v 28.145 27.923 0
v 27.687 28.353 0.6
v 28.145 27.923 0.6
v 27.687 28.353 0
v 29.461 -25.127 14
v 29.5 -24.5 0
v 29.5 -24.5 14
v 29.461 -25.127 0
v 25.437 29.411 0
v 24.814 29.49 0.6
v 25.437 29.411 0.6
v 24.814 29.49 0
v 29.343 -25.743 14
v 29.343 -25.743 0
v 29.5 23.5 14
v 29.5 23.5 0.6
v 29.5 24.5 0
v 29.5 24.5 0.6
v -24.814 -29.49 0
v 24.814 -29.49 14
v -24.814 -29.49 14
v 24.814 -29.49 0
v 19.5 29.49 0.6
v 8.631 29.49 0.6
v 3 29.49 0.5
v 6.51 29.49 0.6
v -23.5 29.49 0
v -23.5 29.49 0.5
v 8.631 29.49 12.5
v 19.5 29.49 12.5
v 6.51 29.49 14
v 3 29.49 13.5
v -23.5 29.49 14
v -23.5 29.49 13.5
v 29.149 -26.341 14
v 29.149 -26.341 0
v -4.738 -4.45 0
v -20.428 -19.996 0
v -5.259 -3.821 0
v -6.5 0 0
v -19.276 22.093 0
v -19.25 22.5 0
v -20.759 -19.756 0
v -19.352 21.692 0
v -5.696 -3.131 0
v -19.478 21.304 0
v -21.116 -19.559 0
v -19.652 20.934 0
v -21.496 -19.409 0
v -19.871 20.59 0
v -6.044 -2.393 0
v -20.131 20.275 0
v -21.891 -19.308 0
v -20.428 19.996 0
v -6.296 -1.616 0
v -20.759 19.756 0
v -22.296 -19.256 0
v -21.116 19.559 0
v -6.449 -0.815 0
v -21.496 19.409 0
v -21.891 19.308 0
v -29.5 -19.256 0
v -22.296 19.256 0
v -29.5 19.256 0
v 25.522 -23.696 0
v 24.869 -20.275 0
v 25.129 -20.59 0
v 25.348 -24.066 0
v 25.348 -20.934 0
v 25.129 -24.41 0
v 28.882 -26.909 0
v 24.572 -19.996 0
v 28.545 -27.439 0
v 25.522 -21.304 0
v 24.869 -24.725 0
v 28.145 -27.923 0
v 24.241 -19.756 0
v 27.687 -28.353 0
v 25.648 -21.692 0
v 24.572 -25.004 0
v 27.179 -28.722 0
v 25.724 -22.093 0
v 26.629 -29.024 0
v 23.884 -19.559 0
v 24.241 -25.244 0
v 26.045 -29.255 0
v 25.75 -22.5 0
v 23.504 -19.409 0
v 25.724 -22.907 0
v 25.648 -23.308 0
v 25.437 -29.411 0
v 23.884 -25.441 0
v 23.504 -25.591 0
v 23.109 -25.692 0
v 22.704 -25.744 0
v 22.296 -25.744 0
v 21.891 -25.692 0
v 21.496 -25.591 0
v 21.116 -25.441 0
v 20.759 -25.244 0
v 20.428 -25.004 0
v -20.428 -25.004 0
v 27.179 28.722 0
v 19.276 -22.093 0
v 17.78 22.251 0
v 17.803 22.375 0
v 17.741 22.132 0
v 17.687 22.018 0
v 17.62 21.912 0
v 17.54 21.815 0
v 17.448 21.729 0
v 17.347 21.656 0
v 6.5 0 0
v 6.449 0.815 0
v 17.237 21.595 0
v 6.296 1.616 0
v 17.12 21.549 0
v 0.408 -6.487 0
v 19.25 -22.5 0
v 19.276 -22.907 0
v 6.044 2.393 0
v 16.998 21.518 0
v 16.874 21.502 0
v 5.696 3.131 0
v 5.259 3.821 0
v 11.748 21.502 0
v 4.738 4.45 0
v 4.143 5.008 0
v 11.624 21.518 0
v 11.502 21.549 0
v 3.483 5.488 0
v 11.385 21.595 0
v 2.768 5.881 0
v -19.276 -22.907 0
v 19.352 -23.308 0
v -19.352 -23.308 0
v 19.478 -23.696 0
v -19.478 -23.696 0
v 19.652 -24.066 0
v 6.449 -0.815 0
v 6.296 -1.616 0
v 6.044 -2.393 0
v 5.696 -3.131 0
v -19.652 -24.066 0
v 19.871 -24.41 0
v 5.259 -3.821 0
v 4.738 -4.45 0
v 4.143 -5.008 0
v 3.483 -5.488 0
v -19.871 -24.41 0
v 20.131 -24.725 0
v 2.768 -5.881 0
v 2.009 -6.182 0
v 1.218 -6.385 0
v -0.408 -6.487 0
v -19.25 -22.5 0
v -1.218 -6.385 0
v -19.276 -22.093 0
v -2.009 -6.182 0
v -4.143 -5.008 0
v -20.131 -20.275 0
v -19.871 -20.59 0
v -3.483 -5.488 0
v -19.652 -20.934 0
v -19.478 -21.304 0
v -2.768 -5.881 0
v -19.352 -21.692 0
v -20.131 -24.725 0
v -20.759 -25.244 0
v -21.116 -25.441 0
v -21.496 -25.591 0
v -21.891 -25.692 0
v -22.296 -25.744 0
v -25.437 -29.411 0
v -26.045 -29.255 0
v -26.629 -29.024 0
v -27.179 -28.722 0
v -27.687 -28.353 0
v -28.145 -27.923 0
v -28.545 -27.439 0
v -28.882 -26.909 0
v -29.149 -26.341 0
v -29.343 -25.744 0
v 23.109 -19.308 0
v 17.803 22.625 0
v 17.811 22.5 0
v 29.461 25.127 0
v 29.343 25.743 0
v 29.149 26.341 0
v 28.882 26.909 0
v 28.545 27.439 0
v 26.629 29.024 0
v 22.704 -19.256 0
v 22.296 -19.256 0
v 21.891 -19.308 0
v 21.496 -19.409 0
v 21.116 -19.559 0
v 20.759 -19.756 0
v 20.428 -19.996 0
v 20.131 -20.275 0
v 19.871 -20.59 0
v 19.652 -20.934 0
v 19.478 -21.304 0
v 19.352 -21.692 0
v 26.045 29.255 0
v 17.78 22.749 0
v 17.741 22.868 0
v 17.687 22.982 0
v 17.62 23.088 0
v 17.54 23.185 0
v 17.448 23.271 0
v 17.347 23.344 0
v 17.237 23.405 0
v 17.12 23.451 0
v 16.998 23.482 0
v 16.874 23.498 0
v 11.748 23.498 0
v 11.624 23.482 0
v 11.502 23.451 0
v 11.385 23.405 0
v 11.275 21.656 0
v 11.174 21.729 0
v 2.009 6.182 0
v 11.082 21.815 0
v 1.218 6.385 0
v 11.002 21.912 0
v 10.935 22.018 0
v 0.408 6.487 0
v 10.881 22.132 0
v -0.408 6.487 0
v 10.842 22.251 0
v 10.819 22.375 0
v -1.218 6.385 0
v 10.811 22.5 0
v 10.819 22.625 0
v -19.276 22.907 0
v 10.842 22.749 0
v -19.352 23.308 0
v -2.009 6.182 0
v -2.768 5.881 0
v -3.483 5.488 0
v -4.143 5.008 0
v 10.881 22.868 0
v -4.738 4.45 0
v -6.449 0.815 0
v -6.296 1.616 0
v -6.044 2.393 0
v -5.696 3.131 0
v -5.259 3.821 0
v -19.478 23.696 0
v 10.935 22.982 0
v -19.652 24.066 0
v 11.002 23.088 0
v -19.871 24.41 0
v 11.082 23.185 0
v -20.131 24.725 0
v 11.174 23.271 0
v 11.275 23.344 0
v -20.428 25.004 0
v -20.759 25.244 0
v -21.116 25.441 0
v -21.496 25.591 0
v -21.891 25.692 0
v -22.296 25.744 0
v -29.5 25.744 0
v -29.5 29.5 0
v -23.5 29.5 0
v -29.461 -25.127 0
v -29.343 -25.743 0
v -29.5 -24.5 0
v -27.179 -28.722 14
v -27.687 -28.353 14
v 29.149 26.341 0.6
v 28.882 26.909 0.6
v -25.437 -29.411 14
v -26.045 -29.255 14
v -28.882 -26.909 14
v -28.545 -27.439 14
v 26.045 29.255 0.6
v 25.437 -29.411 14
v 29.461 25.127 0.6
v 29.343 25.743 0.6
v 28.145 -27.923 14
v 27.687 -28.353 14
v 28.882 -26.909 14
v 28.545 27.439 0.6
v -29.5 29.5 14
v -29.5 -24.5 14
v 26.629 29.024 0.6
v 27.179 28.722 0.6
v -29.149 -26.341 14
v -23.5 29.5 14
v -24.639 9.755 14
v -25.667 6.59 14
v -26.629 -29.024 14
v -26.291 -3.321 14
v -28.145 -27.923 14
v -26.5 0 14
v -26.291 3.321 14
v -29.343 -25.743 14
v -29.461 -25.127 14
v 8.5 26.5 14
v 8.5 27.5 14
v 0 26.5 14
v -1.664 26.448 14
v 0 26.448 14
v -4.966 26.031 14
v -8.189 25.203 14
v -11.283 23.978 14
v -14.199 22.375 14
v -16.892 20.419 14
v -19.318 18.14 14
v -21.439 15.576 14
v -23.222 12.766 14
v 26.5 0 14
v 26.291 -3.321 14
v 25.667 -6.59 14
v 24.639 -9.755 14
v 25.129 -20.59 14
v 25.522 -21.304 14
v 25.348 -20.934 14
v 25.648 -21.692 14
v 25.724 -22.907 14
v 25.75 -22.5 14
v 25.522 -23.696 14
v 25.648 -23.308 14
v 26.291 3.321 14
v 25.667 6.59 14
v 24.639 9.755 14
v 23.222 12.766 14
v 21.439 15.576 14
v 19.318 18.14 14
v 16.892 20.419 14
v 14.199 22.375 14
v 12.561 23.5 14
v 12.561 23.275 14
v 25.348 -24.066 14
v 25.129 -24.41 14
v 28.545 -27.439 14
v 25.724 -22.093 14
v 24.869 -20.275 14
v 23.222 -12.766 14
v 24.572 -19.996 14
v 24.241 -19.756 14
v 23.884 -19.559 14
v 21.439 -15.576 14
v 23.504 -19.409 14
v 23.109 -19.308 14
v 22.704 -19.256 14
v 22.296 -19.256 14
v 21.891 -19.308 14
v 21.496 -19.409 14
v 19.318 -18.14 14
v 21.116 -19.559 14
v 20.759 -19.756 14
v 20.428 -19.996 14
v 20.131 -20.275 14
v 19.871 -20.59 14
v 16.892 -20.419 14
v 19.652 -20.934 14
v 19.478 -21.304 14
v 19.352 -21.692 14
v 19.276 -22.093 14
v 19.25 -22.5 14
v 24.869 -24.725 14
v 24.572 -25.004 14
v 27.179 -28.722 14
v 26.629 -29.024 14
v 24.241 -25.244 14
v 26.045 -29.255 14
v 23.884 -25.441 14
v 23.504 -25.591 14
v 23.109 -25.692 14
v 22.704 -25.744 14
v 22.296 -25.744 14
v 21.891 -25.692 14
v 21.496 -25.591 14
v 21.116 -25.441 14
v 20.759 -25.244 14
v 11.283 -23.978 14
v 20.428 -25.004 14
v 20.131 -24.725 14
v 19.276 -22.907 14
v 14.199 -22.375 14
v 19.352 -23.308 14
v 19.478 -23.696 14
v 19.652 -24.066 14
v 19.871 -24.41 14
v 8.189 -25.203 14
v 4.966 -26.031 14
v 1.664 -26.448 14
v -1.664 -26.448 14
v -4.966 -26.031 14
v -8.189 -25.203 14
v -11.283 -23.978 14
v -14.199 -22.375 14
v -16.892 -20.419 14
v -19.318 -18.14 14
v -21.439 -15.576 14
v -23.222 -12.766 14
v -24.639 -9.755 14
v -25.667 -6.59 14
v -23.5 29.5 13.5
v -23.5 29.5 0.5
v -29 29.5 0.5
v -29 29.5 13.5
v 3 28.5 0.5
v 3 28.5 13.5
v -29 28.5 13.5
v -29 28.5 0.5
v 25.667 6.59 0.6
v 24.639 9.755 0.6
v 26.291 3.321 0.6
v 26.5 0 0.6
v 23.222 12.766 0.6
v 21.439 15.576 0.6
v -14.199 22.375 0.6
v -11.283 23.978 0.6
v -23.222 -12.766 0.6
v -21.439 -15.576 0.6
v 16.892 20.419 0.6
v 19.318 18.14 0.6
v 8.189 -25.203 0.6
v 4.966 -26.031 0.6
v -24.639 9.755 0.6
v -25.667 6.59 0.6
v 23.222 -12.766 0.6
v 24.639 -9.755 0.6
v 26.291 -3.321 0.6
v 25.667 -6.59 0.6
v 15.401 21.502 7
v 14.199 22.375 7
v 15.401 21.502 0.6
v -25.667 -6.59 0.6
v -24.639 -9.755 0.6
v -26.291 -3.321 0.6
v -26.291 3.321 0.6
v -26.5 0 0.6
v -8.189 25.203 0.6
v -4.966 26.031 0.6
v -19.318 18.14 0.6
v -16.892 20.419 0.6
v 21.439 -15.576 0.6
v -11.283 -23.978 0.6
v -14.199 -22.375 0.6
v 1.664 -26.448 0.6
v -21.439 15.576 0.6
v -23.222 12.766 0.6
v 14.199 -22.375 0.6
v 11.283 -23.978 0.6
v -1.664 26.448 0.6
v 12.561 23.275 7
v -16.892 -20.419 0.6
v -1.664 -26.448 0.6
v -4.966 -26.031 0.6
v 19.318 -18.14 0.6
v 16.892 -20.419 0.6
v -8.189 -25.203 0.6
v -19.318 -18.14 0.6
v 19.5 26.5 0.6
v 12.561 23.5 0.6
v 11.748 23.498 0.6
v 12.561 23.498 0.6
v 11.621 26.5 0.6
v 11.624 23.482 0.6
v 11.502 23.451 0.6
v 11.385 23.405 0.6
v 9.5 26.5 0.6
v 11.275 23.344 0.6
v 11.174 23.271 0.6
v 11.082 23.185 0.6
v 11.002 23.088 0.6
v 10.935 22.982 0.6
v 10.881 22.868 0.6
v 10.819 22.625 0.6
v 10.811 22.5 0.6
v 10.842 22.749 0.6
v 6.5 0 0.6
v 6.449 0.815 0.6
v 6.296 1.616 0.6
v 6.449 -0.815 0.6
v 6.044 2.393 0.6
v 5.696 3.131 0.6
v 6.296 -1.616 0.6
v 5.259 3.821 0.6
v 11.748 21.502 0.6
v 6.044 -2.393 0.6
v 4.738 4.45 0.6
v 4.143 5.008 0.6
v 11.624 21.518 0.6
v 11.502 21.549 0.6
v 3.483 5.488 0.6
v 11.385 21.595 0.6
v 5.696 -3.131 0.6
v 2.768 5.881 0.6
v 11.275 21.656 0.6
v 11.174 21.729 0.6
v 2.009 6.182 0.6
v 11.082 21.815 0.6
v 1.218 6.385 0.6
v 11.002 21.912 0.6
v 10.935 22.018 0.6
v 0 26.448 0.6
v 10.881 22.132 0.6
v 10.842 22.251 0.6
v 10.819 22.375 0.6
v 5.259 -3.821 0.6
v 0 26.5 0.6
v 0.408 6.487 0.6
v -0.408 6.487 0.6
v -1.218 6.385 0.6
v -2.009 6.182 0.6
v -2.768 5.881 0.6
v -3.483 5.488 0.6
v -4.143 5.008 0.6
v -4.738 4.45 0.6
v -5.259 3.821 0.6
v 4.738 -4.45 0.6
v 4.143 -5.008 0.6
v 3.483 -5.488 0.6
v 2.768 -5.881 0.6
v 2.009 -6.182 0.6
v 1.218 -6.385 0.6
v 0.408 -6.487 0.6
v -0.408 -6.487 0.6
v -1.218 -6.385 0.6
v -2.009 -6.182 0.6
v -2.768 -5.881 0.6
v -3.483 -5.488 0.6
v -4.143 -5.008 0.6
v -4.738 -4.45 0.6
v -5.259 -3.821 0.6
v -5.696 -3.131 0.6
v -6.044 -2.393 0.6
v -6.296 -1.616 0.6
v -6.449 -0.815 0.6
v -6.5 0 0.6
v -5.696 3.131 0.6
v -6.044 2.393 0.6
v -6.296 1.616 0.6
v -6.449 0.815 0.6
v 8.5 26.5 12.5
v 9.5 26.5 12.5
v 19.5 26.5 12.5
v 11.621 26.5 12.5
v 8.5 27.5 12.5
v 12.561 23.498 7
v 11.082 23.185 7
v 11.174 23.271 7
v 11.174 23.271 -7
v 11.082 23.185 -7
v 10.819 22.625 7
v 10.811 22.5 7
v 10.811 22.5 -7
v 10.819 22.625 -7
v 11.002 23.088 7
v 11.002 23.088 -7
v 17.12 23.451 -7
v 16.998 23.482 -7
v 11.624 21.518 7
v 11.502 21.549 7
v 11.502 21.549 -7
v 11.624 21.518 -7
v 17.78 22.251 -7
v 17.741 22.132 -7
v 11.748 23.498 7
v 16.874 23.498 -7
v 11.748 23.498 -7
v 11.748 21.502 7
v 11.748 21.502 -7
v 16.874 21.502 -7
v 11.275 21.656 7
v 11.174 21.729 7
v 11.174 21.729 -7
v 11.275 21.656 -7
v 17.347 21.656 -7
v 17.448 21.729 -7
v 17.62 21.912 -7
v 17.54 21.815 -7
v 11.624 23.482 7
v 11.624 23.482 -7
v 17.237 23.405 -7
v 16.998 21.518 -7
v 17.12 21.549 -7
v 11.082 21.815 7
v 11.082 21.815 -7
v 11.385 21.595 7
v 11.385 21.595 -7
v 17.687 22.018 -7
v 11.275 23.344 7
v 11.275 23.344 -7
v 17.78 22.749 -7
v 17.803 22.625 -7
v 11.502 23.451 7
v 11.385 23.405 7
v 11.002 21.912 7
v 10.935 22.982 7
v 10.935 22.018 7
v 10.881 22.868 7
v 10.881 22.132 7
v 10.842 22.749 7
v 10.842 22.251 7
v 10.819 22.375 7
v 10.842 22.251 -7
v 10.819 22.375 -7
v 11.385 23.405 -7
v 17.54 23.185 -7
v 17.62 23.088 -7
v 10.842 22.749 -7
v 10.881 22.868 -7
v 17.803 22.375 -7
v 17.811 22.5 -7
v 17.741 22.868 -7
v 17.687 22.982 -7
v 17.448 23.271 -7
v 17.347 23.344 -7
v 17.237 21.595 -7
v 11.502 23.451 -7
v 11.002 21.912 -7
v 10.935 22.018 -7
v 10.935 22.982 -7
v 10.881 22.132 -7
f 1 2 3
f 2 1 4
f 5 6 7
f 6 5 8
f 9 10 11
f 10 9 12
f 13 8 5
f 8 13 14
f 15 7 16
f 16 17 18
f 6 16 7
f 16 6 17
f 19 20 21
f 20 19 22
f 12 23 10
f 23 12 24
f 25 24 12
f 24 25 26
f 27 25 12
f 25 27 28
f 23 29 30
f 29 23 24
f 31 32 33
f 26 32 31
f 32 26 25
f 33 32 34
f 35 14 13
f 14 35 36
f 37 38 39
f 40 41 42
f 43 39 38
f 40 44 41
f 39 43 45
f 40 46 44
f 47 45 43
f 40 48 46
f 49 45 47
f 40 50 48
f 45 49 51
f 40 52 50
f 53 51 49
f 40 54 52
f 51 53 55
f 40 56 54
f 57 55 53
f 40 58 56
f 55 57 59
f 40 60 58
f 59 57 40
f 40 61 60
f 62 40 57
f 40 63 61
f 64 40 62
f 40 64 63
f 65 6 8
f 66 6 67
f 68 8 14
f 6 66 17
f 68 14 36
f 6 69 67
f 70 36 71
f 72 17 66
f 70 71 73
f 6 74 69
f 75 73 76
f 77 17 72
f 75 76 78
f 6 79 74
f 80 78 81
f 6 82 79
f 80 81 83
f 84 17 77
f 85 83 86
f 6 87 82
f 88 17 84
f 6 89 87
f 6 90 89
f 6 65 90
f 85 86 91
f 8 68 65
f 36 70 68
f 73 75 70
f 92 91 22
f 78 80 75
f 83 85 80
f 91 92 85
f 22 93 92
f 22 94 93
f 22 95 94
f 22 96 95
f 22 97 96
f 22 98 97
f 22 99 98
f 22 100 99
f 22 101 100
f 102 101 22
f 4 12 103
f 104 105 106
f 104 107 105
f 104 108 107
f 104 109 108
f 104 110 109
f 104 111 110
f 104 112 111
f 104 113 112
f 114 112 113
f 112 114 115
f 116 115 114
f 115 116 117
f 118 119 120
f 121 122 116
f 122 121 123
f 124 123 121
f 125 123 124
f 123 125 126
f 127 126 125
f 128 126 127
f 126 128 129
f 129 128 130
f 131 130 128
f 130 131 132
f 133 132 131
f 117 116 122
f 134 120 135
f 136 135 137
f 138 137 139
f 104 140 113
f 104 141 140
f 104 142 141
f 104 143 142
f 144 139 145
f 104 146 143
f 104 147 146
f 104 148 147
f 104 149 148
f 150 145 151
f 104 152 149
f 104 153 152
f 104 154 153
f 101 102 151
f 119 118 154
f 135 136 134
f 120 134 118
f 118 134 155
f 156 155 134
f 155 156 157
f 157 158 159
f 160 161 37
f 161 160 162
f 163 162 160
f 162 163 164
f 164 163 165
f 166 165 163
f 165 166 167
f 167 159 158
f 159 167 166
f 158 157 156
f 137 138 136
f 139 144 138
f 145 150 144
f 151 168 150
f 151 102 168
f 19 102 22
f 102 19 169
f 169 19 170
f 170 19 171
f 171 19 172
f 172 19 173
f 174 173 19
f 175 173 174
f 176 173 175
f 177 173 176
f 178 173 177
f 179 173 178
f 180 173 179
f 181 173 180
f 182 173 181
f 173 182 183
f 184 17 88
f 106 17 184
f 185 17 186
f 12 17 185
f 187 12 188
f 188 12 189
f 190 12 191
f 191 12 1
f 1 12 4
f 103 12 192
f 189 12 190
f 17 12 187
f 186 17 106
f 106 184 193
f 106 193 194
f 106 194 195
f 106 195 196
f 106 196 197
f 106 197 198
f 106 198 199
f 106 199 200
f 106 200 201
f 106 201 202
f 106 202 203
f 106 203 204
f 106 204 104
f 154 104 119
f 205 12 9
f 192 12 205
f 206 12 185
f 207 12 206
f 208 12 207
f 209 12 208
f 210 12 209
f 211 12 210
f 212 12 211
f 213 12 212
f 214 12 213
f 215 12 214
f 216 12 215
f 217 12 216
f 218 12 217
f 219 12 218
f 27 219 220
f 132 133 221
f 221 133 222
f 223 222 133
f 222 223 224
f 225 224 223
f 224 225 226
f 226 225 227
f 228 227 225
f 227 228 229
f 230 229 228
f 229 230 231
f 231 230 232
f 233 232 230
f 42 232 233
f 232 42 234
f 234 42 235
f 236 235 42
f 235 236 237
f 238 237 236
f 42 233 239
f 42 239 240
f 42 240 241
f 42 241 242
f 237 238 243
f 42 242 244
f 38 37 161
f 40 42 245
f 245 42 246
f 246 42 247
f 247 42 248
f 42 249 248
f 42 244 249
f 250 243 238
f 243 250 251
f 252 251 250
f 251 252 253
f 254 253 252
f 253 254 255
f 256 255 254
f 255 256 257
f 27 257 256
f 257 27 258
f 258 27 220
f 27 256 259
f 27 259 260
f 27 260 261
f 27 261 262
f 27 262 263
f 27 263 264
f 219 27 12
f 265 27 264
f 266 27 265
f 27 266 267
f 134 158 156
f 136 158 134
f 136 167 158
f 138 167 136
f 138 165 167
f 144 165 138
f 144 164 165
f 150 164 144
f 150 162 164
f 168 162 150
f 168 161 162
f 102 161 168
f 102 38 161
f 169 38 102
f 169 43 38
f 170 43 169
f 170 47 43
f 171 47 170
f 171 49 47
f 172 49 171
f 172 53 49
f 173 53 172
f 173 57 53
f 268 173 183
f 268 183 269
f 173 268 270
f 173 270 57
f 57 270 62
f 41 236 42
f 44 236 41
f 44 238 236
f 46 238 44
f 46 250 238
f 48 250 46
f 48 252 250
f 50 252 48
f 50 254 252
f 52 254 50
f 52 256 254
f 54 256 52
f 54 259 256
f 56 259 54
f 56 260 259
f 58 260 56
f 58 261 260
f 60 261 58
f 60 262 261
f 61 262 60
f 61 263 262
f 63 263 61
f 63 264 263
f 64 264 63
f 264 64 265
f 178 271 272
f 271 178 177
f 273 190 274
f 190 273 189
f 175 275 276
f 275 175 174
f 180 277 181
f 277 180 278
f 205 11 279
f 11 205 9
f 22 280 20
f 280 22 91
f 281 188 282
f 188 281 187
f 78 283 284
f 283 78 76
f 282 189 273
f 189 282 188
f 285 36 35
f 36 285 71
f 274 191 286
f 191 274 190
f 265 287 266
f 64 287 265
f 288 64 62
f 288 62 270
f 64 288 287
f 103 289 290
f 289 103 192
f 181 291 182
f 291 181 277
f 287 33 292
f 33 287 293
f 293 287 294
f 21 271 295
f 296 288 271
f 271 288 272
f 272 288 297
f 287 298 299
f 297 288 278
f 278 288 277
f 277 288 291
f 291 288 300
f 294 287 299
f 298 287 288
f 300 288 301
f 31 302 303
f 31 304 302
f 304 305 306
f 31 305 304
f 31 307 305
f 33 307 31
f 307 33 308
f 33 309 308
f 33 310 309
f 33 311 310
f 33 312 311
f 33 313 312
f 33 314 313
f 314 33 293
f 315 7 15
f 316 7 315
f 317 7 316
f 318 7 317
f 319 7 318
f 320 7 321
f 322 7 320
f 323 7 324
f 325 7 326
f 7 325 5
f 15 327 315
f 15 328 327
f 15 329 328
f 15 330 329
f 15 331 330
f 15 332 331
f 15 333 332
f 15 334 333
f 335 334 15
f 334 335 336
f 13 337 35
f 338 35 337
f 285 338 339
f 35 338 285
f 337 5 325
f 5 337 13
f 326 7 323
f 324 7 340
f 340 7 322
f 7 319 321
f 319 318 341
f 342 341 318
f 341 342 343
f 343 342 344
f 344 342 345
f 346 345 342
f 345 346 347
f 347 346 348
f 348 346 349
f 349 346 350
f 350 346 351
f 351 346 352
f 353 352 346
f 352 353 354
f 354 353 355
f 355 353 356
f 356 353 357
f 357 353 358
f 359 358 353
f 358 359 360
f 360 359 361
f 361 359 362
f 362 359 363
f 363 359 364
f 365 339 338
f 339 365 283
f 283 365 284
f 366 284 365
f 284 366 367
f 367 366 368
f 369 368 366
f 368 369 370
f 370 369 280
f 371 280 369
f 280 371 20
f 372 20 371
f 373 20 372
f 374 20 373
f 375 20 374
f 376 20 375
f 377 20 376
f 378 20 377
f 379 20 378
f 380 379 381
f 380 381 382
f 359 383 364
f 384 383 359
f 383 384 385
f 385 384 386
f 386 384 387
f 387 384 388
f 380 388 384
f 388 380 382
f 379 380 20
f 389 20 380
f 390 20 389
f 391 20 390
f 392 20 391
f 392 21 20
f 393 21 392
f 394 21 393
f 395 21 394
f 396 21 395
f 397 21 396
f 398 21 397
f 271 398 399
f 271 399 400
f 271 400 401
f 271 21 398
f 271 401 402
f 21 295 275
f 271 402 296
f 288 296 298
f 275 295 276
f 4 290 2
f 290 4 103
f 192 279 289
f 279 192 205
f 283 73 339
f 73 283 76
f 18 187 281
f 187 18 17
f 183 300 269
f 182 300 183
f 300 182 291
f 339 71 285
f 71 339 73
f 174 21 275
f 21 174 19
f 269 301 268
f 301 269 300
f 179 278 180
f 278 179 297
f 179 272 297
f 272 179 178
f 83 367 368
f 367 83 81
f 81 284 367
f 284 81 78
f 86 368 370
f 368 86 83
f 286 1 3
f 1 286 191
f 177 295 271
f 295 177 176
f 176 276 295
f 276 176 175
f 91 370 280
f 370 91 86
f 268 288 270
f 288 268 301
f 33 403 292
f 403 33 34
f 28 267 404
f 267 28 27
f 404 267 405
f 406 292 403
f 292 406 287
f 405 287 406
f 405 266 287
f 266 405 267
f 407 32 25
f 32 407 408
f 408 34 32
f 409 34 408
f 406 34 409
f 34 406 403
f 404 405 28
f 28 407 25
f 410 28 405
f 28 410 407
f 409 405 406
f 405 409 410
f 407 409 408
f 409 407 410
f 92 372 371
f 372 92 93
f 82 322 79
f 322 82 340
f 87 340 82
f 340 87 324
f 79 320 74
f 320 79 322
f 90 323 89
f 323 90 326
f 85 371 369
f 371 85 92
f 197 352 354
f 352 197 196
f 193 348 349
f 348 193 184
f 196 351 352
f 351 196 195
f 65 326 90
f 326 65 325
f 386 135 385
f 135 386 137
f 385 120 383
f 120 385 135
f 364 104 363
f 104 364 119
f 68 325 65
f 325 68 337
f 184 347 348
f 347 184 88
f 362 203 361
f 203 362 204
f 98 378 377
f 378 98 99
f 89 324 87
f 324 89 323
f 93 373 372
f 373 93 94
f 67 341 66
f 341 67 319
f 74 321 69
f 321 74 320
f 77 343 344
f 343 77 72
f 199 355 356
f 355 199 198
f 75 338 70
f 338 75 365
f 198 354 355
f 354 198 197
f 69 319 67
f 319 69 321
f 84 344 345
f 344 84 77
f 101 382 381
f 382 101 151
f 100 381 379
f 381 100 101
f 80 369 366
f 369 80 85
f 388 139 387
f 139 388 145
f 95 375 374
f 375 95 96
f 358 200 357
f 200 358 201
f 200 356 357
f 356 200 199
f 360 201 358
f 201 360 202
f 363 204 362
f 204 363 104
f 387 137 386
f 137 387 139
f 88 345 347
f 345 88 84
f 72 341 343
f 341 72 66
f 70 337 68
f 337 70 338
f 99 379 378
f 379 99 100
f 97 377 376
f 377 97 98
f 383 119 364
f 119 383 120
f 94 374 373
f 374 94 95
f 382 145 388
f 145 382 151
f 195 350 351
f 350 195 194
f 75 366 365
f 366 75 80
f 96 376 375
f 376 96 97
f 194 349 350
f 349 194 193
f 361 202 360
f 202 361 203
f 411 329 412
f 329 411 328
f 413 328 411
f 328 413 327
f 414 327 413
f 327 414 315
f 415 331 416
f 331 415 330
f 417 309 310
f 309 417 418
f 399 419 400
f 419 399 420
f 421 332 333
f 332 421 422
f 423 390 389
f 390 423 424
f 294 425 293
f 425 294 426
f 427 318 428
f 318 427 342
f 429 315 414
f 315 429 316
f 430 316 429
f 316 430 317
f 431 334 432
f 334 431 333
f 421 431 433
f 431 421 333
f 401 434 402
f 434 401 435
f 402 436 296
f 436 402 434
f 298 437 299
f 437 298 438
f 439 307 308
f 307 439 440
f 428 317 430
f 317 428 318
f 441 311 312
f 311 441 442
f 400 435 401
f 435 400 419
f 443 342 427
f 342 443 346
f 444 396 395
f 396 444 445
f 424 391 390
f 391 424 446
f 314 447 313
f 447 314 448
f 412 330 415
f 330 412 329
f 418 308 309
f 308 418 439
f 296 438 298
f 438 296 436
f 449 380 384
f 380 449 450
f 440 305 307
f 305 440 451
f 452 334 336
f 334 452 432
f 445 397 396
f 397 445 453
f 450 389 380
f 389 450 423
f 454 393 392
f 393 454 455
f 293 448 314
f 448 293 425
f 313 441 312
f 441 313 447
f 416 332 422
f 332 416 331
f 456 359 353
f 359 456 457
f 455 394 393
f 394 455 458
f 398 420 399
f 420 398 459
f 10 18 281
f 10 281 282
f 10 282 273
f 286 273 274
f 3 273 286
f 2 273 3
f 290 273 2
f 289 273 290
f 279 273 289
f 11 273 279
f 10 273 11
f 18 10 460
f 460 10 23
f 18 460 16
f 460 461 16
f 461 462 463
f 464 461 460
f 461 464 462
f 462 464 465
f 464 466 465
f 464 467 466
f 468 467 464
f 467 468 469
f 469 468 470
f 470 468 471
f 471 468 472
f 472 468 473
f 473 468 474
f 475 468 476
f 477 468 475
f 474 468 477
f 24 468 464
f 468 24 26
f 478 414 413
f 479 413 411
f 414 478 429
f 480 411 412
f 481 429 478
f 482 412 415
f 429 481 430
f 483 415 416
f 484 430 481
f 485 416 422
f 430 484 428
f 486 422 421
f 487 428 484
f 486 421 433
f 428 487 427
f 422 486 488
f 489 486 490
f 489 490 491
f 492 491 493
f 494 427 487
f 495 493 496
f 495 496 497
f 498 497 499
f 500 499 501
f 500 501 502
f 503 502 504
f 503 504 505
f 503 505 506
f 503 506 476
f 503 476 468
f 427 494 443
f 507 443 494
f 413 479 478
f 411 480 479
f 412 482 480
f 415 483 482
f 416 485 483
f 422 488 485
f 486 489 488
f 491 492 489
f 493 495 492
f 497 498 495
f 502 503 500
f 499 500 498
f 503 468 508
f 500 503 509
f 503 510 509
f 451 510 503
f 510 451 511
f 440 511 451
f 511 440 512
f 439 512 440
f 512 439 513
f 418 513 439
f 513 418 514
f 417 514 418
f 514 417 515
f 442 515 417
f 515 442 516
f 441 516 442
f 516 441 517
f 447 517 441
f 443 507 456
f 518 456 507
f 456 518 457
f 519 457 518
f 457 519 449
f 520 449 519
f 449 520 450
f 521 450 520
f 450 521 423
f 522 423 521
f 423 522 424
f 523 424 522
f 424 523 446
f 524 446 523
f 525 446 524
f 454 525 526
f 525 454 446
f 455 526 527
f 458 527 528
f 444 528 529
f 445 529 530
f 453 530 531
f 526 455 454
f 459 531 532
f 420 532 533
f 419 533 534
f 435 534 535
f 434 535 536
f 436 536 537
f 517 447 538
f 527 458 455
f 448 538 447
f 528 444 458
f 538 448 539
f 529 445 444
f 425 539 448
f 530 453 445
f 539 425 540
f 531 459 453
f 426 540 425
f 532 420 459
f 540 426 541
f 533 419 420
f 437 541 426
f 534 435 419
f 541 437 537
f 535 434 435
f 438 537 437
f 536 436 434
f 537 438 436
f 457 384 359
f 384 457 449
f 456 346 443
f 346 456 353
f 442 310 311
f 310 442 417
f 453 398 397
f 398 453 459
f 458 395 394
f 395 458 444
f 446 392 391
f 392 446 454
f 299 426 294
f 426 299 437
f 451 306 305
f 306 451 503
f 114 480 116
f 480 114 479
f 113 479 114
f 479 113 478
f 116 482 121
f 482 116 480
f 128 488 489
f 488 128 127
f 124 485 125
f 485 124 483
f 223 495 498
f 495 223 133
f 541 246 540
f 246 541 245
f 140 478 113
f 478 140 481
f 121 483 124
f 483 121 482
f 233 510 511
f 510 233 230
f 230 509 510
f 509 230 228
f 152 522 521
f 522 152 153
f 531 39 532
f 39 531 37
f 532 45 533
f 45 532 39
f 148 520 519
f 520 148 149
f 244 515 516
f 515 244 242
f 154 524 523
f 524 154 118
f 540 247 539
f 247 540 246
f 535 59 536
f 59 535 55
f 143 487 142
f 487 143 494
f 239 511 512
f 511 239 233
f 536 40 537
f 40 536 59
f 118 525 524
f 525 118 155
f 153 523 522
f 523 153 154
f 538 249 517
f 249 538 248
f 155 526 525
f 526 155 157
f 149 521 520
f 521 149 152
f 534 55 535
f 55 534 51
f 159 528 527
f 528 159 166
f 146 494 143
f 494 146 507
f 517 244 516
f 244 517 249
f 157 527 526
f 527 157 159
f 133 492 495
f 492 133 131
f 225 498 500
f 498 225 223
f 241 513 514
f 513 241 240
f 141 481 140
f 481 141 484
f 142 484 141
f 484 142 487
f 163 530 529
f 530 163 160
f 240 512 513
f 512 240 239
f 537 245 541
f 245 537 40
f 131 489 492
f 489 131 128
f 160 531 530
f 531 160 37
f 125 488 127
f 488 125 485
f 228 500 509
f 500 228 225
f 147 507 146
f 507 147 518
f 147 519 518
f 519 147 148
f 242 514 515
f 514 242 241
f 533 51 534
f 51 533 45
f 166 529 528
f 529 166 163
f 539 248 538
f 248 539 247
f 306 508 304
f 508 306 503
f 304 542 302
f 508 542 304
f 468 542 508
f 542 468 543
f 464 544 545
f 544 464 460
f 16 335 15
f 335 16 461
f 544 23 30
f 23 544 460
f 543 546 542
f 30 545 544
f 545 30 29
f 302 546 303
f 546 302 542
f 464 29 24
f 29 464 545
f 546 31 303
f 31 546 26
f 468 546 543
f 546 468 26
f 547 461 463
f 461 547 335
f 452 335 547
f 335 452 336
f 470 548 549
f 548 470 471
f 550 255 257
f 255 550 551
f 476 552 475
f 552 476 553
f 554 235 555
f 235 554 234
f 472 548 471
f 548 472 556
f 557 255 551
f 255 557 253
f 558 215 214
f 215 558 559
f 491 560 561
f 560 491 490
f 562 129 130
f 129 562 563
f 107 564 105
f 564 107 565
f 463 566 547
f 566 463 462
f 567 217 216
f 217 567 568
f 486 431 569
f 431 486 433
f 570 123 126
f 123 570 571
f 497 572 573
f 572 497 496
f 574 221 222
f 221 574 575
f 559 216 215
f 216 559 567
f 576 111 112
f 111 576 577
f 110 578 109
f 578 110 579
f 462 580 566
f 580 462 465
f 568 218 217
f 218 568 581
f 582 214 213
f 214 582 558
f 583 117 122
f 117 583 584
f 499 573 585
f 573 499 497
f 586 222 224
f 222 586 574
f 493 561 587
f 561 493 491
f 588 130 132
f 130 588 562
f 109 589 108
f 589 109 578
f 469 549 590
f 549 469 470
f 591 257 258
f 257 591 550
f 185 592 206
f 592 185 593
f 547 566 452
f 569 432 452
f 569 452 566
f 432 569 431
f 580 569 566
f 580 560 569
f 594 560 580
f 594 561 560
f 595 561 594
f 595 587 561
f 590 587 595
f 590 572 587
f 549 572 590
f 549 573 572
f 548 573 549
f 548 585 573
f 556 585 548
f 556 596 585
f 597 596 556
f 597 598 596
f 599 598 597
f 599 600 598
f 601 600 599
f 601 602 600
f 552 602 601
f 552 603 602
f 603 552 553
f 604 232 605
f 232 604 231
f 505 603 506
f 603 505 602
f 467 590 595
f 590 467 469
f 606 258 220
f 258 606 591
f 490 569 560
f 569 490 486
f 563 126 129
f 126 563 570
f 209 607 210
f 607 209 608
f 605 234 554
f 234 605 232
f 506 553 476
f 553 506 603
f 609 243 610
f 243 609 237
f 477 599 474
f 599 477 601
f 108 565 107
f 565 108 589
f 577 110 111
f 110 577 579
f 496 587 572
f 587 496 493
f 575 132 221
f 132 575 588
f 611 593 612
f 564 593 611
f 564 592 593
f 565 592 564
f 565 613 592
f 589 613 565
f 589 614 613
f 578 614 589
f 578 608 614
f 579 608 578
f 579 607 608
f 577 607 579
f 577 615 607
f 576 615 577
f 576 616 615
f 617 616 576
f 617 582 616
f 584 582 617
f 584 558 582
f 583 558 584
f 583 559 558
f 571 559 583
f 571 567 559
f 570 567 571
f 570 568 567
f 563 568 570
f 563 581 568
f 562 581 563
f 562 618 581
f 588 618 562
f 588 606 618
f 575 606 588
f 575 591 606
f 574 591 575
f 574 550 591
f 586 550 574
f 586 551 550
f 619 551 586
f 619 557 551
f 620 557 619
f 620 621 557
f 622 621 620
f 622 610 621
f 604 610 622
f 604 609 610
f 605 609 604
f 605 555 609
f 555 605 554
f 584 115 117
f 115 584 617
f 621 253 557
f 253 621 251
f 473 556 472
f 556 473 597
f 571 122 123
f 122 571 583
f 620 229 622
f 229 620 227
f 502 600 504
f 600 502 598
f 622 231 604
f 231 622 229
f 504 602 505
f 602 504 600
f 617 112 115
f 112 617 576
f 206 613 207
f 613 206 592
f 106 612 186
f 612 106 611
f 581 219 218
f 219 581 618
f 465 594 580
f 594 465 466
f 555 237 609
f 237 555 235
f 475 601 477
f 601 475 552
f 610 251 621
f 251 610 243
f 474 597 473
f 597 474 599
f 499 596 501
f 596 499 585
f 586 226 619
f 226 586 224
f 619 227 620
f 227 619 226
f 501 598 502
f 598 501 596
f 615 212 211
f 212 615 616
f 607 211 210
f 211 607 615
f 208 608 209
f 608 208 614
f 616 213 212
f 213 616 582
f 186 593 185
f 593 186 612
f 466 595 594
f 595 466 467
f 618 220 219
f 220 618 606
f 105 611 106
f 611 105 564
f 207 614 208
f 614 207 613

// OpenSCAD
$fn = 50;


union() {
	difference() {
		union() {
			hull() {
				translate(v = [-24.5000000000, 24.5000000000, 0]) {
					cylinder(h = 14, r = 5);
				}
				translate(v = [24.5000000000, 24.5000000000, 0]) {
					cylinder(h = 14, r = 5);
				}
				translate(v = [-24.5000000000, -24.5000000000, 0]) {
					cylinder(h = 14, r = 5);
				}
				translate(v = [24.5000000000, -24.5000000000, 0]) {
					cylinder(h = 14, r = 5);
				}
			}
			translate(v = [-29.5000000000, 23.5000000000, 0]) {
				cube(size = [6, 6, 14]);
			}
		}
		union() {
			translate(v = [-30.0000000000, -22.5000000000, -250.0000000000]) {
				rotate(a = [0, 0, 0]) {
					difference() {
						union() {
							hull() {
								translate(v = [7.5000000000, 0, 0]) {
									cylinder(h = 250, r = 3.2500000000, r1 = 3.2500000000, r2 = 3.2500000000);
								}
								translate(v = [-7.5000000000, 0, 0]) {
									cylinder(h = 250, r = 3.2500000000, r1 = 3.2500000000, r2 = 3.2500000000);
								}
							}
						}
						union();
					}
				}
			}
			translate(v = [-30.0000000000, 22.5000000000, -250.0000000000]) {
				rotate(a = [0, 0, 0]) {
					difference() {
						union() {
							hull() {
								translate(v = [7.5000000000, 0, 0]) {
									cylinder(h = 250, r = 3.2500000000, r1 = 3.2500000000, r2 = 3.2500000000);
								}
								translate(v = [-7.5000000000, 0, 0]) {
									cylinder(h = 250, r = 3.2500000000, r1 = 3.2500000000, r2 = 3.2500000000);
								}
							}
						}
						union();
					}
				}
			}
			translate(v = [-29.0000000000, 28.5000000000, 0.5000000000]) {
				cube(size = [32, 1, 13.0000000000]);
			}
			translate(v = [22.5000000000, -22.5000000000, 0]) {
				cylinder(h = 100, r = 3.2500000000);
			}
			translate(v = [0, 0, 0.6000000000]) {
				cylinder(h = 16.4000000000, r = 26.5000000000);
			}
			translate(v = [0, 0, -7.0000000000]) {
				cylinder(h = 14, r = 6.5000000000);
			}
			translate(v = [0.0000000000, 23.5000000000, 0.6000000000]) {
				cube(size = [29.5000000000, 3, 16.4000000000]);
			}
			translate(v = [19.5000000000, 23.5000000000, 0.6000000000]) {
				cube(size = [10, 6, 16.4000000000]);
			}
			translate(v = [8.5000000000, 23.5000000000, 12.5000000000]) {
				cube(size = [21, 6, 1.5000000000]);
			}
			translate(v = [5.7500000000, 30.2500000000, 0.6000000000]) {
				rotate(a = [0, 0, -45]) {
					cube(size = [7.5000000000, 1.5000000000, 16.4000000000]);
				}
			}
			translate(v = [5.0610000000, 21.5000000000, 0.6000000000]) {
				cube(size = [7.5000000000, 2, 13.4000000000]);
			}
		}
	}
	union() {
		translate(v = [14.3110000000, 22.5000000000, -7.0000000000]) {
			rotate(a = [0, 0, 0]) {
				difference() {
					union() {
						#hull() {
							#translate(v = [2.5000000000, 0, 0]) {
								cylinder(h = 14, r = 1.0000000000, r1 = 1.0000000000, r2 = 1.0000000000);
							}
							#translate(v = [-2.5000000000, 0, 0]) {
								cylinder(h = 14, r = 1.0000000000, r1 = 1.0000000000, r2 = 1.0000000000);
							}
						}
					}
					union();
				}
			}
		}
	}
}
